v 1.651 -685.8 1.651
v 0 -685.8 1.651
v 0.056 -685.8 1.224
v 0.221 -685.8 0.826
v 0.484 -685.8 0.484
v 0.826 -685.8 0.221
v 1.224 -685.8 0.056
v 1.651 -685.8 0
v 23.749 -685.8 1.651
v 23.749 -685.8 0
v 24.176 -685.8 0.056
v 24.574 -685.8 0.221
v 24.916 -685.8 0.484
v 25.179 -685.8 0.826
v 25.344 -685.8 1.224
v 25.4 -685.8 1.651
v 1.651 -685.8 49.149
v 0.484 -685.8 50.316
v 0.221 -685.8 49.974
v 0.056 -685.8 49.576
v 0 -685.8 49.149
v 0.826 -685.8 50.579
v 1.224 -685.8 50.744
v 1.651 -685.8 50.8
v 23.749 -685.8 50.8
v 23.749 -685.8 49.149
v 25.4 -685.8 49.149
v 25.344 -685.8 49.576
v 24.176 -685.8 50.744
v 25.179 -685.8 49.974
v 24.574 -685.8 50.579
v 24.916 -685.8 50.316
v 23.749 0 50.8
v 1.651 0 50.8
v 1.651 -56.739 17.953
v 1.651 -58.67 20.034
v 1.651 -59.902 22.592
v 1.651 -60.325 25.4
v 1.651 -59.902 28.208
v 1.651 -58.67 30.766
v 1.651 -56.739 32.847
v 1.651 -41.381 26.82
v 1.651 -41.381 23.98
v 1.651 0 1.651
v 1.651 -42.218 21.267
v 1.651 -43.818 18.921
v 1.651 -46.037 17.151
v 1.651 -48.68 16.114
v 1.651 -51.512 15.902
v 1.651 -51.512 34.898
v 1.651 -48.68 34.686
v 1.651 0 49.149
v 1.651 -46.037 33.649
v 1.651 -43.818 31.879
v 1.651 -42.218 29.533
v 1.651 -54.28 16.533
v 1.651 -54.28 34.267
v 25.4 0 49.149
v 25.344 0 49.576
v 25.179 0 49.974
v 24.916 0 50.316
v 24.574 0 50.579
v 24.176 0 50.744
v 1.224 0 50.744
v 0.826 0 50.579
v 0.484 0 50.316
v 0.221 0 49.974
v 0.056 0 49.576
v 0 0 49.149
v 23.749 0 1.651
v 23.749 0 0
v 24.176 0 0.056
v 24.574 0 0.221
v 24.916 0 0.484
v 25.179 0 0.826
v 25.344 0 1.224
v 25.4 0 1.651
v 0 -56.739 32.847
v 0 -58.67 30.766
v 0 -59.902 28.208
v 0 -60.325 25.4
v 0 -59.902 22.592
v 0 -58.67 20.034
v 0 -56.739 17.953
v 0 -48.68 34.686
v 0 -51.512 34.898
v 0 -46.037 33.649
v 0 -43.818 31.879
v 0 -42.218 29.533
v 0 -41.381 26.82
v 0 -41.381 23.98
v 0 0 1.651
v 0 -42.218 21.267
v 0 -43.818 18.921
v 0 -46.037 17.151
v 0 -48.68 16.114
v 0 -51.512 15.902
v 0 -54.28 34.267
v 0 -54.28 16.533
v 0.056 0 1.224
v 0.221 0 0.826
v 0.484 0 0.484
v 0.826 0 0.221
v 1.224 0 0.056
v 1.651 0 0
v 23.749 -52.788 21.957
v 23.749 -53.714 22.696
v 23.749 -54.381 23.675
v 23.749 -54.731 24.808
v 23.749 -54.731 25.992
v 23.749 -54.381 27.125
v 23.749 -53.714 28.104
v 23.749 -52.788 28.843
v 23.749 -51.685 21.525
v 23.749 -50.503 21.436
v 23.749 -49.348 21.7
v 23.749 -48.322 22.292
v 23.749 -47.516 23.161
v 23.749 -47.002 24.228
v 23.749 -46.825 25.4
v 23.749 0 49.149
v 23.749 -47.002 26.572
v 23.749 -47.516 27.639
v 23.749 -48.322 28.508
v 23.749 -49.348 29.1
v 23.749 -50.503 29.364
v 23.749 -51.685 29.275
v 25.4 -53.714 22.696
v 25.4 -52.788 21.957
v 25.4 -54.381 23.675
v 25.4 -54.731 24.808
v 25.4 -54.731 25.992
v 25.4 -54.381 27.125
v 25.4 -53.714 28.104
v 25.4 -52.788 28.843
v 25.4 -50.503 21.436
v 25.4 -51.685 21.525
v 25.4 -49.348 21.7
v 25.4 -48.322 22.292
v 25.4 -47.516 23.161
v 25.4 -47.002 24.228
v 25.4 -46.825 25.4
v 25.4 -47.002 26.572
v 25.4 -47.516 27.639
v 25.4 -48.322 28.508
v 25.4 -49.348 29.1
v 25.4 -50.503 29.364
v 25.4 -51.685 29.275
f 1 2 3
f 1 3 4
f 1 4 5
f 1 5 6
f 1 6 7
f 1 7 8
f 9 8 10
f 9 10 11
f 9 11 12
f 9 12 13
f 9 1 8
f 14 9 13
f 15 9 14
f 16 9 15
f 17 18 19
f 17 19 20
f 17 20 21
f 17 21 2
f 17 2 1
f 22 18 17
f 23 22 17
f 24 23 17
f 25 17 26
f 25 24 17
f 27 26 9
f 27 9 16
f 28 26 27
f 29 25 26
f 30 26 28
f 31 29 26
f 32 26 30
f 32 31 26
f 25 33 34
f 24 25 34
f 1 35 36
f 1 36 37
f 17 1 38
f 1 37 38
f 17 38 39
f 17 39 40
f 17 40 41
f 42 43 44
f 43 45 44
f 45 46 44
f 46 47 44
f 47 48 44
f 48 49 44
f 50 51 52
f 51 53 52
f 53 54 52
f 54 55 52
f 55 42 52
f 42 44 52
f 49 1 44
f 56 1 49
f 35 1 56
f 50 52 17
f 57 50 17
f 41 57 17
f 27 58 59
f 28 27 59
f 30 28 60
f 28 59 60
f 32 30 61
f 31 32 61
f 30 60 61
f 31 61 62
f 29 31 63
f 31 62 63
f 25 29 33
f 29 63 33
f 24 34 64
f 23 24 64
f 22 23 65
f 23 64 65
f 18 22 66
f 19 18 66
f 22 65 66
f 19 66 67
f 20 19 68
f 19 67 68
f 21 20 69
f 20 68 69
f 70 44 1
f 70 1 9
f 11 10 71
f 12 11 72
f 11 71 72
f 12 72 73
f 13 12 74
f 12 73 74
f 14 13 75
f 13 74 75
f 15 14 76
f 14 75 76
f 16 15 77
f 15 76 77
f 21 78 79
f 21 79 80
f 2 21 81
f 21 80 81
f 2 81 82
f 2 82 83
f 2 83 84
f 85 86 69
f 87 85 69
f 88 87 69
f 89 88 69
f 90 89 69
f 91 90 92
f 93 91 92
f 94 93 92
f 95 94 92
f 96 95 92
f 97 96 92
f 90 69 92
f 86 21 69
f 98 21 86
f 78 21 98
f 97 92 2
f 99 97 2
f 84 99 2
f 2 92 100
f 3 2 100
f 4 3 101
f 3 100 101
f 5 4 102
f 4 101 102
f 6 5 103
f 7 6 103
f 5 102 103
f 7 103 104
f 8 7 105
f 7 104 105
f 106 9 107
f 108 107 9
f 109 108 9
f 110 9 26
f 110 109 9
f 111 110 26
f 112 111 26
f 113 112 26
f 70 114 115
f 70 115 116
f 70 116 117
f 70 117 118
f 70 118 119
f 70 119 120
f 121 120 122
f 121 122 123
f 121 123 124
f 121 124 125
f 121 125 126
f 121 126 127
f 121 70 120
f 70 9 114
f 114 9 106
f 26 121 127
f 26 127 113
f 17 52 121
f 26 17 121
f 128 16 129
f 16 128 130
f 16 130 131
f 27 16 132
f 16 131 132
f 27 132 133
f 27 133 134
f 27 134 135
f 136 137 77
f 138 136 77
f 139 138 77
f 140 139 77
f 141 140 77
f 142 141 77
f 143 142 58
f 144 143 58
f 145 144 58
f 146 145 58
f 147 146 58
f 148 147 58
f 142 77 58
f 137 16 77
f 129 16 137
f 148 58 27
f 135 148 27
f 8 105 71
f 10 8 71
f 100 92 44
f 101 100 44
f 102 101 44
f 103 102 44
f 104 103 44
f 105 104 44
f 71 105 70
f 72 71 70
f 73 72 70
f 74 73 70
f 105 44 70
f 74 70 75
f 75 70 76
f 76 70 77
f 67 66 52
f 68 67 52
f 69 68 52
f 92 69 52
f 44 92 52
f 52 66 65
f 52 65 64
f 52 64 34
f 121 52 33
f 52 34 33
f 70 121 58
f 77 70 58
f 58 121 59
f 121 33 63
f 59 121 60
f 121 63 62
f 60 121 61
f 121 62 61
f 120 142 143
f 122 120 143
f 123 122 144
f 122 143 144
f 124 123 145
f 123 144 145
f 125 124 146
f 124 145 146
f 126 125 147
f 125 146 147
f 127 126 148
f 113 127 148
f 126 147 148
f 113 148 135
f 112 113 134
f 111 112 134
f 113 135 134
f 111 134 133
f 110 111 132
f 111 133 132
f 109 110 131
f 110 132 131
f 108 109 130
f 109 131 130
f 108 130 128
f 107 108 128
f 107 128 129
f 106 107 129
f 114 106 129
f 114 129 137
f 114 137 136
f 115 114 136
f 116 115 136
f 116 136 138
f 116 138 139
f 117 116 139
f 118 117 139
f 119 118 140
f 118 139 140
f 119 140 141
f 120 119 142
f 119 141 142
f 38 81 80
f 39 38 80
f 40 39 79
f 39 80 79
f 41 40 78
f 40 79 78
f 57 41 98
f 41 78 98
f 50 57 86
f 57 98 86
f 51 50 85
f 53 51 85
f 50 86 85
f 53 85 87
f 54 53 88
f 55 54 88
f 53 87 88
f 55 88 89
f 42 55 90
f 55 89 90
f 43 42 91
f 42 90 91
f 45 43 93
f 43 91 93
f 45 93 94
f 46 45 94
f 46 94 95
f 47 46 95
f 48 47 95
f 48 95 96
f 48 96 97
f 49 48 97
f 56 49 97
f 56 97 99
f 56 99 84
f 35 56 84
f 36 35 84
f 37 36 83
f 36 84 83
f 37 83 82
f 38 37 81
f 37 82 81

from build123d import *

# Parameters (mm, degrees)
F0_W     = 22.098
F0_H     = 47.498
F1_DEPTH = 685.8
F2_R     = 3.9751
F3_DEPTH = 1.651
F4_R     = 9.525
F5_DEPTH = 1.651


with BuildPart() as f1:
    # F0 (on Front) → F1 (new body)
    with BuildSketch(Plane.XZ):
        with BuildLine():
            ThreePointArc((0, 1.651), (0.483567, 0.483567), (1.651, 0))
            Line((1.651, 0), (23.749, 0))
            ThreePointArc((23.749, 0), (24.916433, 0.483567), (25.4, 1.651))
            Line((25.4, 1.651), (25.4, 49.149))
            ThreePointArc((25.4, 49.149), (24.916433, 50.316433), (23.749, 50.8))
            Line((23.749, 50.8), (1.651, 50.8))
            ThreePointArc((1.651, 50.8), (0.483567, 50.316433), (0, 49.149))
            Line((0, 49.149), (0, 1.651))
        make_face()
        with Locations((12.7, 25.4)):
            Rectangle(F0_W, F0_H, mode=Mode.SUBTRACT)
    extrude(amount=F1_DEPTH)

    # F2 (on face) → F3 (cut, through all)
    with BuildSketch(Plane.YZ.offset(25.4)):
        with Locations((-50.8, 25.4)):
            Circle(F2_R)
    extrude(amount=-F3_DEPTH, mode=Mode.SUBTRACT)

    # F4 (on face) → F5 (cut, through all)
    with BuildSketch(Plane(origin=(0, 0, 0), x_dir=(0, -1, 0), z_dir=(-1, 0, 0))):
        with Locations((50.8, 25.4)):
            Circle(F4_R)
    extrude(amount=-F5_DEPTH, mode=Mode.SUBTRACT)


solid = f1.part
